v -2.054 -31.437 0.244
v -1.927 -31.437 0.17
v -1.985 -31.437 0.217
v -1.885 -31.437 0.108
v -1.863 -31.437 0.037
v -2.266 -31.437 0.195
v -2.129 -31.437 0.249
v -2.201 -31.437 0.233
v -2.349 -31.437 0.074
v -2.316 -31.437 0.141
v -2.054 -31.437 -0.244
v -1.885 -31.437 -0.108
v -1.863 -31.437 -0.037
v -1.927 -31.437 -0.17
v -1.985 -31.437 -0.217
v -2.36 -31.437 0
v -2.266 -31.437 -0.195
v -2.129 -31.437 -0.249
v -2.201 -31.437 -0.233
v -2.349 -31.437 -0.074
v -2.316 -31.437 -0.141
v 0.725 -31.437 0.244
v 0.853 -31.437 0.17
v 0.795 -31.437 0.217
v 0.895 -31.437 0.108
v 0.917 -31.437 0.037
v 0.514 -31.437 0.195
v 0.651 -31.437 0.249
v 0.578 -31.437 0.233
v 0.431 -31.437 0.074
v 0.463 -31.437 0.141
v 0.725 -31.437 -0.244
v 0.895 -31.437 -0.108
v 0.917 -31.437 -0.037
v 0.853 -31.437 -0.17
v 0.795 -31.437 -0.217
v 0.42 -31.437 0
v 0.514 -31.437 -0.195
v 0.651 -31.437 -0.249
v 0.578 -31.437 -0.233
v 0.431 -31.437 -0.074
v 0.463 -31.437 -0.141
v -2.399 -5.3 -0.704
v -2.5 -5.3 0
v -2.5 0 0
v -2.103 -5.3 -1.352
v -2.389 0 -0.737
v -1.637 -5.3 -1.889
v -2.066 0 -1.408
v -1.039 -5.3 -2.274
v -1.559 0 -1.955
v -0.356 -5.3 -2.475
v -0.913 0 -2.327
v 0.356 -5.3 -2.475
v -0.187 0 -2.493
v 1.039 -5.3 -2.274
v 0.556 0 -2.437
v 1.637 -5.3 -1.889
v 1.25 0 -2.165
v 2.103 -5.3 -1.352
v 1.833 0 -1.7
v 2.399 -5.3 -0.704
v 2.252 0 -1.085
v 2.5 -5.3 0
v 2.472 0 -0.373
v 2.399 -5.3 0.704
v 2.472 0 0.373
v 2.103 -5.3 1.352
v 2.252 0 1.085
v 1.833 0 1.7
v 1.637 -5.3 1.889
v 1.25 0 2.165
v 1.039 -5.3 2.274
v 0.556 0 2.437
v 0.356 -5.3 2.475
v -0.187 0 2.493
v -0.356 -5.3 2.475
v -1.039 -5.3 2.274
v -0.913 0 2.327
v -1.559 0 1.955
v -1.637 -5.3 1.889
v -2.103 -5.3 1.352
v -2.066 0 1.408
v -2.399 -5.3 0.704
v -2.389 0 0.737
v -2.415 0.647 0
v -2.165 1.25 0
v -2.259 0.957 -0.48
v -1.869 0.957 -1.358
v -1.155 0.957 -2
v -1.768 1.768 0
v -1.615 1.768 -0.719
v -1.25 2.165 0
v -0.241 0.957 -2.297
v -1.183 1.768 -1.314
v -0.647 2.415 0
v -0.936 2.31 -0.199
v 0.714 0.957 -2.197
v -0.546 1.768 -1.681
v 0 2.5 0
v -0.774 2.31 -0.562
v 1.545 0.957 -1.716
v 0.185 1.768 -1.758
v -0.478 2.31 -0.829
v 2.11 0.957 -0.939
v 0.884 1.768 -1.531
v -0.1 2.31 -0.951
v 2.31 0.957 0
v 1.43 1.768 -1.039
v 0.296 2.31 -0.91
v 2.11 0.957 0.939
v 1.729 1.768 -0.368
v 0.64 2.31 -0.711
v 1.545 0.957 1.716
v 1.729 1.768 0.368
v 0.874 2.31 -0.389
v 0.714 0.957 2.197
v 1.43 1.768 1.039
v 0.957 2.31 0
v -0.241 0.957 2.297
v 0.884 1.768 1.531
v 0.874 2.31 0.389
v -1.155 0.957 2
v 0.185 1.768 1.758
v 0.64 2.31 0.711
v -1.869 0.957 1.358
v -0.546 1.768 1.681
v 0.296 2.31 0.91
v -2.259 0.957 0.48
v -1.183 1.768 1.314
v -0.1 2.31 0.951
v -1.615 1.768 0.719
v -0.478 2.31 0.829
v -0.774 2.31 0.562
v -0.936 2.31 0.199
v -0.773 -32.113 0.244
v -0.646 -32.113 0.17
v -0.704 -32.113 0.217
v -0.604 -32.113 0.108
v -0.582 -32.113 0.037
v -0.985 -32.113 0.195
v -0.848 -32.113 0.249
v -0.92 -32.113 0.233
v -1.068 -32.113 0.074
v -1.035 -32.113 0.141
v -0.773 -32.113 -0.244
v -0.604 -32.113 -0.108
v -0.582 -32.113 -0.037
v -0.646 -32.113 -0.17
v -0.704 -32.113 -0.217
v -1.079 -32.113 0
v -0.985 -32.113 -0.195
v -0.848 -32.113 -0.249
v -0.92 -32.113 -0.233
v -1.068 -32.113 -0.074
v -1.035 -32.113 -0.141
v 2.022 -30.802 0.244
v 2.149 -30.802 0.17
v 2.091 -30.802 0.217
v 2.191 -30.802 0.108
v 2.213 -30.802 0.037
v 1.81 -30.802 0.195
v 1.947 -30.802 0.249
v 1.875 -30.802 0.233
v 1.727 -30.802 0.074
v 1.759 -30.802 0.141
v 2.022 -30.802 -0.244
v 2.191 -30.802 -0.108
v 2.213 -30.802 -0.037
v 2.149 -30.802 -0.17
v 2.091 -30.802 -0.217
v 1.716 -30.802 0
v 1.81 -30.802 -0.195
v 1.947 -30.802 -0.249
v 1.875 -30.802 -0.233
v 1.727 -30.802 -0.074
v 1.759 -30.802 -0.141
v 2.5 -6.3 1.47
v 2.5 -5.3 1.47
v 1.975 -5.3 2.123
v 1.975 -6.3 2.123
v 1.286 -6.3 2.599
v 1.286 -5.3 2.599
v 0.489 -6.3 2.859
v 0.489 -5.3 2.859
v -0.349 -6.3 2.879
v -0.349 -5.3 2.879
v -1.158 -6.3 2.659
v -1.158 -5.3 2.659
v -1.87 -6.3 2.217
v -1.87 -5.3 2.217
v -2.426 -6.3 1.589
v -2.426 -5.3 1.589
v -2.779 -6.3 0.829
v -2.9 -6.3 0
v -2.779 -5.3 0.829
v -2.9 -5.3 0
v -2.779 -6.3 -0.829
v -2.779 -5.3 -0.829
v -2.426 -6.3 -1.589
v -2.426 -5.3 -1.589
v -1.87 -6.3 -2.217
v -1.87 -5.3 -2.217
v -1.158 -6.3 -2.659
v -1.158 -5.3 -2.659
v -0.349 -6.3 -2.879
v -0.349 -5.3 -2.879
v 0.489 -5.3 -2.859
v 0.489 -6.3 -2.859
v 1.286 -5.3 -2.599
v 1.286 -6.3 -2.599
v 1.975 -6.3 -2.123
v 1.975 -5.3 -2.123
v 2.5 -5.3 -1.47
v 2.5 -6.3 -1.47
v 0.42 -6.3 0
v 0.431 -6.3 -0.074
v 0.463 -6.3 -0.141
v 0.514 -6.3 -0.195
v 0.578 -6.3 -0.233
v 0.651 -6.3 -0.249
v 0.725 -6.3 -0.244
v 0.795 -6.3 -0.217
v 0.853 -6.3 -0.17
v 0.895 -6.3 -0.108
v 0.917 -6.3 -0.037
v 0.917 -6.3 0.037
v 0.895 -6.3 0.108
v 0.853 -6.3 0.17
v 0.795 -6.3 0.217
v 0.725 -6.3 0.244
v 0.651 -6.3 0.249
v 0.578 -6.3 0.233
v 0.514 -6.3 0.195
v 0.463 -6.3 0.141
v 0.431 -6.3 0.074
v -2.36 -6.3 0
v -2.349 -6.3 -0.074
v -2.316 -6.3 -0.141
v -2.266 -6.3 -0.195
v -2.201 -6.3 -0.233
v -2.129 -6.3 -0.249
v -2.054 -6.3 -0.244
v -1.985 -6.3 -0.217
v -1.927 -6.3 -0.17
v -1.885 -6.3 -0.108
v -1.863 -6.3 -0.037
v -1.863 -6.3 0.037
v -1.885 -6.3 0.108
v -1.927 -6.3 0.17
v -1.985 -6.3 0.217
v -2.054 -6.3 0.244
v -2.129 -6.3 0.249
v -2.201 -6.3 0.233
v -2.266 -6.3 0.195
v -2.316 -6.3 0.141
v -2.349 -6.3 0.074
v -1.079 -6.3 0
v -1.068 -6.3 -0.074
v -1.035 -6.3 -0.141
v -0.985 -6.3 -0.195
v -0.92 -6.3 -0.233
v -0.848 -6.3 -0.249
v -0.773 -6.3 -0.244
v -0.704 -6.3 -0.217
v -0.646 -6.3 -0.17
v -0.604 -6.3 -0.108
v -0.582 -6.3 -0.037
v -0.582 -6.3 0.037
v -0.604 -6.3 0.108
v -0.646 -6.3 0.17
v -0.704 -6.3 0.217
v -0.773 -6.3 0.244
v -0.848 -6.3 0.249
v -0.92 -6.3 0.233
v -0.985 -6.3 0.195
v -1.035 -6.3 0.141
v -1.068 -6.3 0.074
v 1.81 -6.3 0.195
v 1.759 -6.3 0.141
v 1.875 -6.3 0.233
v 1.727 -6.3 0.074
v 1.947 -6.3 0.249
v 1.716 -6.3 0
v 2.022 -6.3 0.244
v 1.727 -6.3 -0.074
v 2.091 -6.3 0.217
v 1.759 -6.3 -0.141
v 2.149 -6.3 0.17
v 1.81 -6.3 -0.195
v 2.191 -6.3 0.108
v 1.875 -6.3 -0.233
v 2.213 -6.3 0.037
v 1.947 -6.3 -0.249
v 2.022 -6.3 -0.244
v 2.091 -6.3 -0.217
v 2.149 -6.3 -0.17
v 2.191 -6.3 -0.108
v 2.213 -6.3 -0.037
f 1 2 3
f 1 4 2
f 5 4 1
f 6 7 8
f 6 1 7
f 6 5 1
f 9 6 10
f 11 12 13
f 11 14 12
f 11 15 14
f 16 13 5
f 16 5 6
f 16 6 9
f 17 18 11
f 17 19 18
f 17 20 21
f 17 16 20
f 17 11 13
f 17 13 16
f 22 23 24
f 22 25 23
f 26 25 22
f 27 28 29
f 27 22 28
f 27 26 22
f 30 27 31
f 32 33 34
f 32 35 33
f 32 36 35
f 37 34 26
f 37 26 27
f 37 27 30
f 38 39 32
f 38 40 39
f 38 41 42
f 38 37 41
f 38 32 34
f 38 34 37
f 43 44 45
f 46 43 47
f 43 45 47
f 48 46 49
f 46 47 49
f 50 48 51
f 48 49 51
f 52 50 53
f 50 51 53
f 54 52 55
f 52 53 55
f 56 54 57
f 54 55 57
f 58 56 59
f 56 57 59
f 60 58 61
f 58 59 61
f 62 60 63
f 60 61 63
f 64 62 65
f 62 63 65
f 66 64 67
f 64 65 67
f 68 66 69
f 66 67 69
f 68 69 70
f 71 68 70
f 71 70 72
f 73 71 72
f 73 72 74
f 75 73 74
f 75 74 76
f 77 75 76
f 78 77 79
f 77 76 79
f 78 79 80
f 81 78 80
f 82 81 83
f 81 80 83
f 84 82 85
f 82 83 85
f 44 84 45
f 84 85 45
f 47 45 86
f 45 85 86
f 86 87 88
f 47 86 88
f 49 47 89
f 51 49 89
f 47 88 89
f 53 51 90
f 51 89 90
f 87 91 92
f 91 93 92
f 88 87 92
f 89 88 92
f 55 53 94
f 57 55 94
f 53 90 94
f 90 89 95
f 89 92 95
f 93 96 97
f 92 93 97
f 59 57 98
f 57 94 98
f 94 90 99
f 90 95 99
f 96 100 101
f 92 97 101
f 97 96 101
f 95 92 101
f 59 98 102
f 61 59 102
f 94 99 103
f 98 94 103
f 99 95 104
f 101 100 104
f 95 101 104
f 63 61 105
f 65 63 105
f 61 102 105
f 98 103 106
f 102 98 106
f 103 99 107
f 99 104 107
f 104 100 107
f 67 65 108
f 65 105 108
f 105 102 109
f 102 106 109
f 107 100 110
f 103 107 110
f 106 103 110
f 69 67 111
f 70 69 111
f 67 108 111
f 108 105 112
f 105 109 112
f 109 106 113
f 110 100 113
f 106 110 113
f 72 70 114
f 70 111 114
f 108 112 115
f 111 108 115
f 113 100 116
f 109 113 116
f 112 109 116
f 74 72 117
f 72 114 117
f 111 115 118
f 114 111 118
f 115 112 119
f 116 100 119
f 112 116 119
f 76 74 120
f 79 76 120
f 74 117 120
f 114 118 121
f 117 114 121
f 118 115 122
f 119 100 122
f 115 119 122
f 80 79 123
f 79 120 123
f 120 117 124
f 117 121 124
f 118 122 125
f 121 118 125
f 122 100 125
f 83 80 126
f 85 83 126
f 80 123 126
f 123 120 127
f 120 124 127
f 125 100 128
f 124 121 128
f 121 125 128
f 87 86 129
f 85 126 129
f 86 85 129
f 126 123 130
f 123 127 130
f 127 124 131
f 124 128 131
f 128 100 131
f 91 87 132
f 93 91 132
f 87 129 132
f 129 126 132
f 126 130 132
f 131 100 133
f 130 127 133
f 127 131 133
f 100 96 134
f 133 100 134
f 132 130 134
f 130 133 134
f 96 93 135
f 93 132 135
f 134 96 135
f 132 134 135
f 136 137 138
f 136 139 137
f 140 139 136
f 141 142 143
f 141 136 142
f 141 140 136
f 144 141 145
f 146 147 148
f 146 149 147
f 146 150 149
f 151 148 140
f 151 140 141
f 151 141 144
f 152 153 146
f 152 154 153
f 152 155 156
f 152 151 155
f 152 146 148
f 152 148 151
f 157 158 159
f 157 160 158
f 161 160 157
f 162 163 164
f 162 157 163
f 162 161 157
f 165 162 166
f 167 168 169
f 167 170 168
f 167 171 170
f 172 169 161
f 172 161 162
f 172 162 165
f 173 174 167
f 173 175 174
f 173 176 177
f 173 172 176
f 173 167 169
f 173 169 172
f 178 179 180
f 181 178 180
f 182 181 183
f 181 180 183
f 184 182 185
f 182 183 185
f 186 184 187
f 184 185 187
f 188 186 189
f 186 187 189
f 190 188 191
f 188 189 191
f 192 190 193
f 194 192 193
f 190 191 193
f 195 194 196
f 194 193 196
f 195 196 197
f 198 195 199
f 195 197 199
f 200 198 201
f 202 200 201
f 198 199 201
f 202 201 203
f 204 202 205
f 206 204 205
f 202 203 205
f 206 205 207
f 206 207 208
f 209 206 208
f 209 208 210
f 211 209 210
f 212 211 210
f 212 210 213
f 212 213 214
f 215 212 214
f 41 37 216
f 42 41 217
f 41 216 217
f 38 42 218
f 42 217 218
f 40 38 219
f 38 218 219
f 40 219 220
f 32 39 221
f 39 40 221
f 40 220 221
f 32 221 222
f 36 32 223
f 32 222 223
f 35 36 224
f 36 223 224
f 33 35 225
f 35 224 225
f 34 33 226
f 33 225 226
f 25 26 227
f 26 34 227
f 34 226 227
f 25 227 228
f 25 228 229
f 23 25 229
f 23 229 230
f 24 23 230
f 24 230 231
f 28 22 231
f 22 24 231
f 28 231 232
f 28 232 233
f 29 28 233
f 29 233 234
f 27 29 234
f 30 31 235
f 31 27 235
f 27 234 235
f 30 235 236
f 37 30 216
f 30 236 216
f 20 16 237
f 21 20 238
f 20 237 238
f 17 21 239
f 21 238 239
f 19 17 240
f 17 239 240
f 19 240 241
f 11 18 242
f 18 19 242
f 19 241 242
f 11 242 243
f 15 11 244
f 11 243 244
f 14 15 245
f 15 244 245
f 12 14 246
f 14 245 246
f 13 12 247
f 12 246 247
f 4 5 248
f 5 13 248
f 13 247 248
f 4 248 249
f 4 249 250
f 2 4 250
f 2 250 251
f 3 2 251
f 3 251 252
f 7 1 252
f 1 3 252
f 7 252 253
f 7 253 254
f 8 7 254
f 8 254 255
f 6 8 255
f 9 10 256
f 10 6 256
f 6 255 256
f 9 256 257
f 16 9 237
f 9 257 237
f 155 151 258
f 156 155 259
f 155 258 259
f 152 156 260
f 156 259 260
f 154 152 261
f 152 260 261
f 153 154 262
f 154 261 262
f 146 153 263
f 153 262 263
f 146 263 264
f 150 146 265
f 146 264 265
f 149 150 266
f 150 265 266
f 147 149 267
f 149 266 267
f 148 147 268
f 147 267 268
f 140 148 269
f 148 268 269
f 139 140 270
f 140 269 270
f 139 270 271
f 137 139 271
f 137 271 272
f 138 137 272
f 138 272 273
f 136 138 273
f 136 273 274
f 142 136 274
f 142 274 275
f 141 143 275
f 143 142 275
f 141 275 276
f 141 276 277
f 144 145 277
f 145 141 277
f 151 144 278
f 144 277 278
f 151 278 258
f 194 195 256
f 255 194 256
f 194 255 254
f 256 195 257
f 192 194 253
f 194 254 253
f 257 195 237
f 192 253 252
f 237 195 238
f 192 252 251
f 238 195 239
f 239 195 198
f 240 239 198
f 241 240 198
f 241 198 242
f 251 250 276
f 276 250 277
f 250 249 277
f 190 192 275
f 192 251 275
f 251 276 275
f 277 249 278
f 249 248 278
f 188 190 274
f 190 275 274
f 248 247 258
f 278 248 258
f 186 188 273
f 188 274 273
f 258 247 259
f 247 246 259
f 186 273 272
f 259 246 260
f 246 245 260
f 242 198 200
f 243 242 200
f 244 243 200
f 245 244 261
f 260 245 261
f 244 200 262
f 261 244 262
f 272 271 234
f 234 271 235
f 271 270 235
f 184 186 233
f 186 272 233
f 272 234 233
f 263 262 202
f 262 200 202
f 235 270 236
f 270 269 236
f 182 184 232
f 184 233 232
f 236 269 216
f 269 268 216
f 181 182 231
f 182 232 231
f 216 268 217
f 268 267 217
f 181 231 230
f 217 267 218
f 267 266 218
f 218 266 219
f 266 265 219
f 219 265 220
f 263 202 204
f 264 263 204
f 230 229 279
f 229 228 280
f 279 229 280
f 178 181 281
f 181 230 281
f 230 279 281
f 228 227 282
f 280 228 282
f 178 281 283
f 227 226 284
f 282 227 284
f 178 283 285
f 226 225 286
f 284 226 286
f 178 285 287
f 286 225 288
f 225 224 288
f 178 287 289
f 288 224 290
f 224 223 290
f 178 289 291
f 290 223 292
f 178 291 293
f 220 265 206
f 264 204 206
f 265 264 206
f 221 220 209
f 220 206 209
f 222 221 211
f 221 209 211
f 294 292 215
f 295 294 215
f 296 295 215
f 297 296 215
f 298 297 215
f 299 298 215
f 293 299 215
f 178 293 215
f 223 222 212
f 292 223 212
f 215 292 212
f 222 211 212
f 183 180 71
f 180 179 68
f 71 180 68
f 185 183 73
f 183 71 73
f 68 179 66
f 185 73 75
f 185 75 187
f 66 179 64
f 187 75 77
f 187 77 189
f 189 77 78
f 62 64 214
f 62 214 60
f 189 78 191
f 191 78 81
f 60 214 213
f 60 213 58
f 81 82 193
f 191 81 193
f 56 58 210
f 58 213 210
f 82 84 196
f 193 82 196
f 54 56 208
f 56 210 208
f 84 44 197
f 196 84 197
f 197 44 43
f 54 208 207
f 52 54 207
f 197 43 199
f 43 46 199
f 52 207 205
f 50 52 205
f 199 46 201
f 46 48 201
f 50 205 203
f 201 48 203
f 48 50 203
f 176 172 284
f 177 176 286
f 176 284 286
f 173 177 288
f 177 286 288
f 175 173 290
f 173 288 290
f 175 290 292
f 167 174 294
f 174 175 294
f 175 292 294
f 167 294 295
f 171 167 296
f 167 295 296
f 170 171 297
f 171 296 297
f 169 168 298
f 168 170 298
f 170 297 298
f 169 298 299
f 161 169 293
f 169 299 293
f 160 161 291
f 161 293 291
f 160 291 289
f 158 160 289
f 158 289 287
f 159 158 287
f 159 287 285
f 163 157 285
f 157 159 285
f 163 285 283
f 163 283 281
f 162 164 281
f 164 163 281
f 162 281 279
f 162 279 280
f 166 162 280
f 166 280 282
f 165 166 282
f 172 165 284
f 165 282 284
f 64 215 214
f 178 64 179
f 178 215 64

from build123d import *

# Parameters (mm, degrees)
CUT_EXTRUDE1_REACH      = 11.709
SKETCH8_R               = 0.25
BOSS_EXTRUDE1_DEPTH     = 26.5
CUT_EXTRUDE2_DEPTH      = 34.05540803
CUT_EXTRUDE2_DEPTH_BACK = 34.05540803


with BuildPart() as part:
    # Sketch4 → Revolve1 (revolve)
    with BuildSketch(Plane.XY, mode=Mode.PRIVATE) as revolve1_sk:
        with BuildLine():
            Line((0, 2.5), (0, -6.3))
            Line((0, -6.3), (2.9, -6.3))
            Line((2.9, -6.3), (2.9, -5.3))
            Line((2.9, -5.3), (2.5, -5.3))
            Line((2.5, -5.3), (2.5, 0))
            ThreePointArc((2.5, 0), (1.767766953, 1.767766953), (0, 2.5))
        make_face()
    revolve(revolve1_sk.sketch.rotate(Axis((0, 2.5, 0), (0, -1, 0)), 180), axis=Axis((0, 2.5, 0), (0, -1, 0)))

    # Sketch7 → Cut-Extrude1 (cut, up to next)
    with BuildSketch(Plane(origin=(0, -6.3, 0), x_dir=(-1, 0, 0), z_dir=(0, -1, 0)), mode=Mode.PRIVATE) as cut_extrude1_sk1:
        with BuildLine():
            Line((-2.5, 1.469693846), (-2.5, -1.469693846))
            ThreePointArc((-2.5, -1.469693846), (-2.9, 0), (-2.5, 1.469693846))
        make_face()
    cut_extrude1_tool1 = extrude(cut_extrude1_sk1.sketch, amount=-CUT_EXTRUDE1_REACH, mode=Mode.PRIVATE) & part.part
    add(cut_extrude1_tool1.solids().sort_by_distance((2.660985, -6.3, 0))[0], mode=Mode.SUBTRACT)

    # Sketch8 → Boss-Extrude1 (add)
    with BuildSketch(Plane(origin=(0, -6.3, 0), x_dir=(-1, 0, 0), z_dir=(0, -1, 0))):
        with Locations((-1.966028559, 0)):
            Circle(SKETCH8_R)
        with Locations((-0.669516841, 0)):
            Circle(SKETCH8_R)
        with Locations((0.828847001, 0)):
            Circle(SKETCH8_R)
        with Locations((2.109831632, 0)):
            Circle(SKETCH8_R)
    extrude(amount=BOSS_EXTRUDE1_DEPTH)

    # Sketch9 → Cut-Extrude2 (cut, two sides: drawn at the far end of the back side and taken through both)
    with BuildSketch(Plane.XY.offset(-CUT_EXTRUDE2_DEPTH_BACK)):
        Polygon((2.216028559, -30.801737738), (1.716028559, -30.801737738), (0.919516841, -31.436646975), (0.419516841, -31.436646975), (-0.318229125, -32.112599285), (-1.342625606, -32.112599285), (-1.859831632, -31.436646975), (-2.359831632, -31.436646975), (-2.359831632, -33.265580611), (2.627654793, -33.265580611), (2.686516226, -30.801737738), align=None)
    extrude(amount=CUT_EXTRUDE2_DEPTH + CUT_EXTRUDE2_DEPTH_BACK, mode=Mode.SUBTRACT)


solid = part.part
